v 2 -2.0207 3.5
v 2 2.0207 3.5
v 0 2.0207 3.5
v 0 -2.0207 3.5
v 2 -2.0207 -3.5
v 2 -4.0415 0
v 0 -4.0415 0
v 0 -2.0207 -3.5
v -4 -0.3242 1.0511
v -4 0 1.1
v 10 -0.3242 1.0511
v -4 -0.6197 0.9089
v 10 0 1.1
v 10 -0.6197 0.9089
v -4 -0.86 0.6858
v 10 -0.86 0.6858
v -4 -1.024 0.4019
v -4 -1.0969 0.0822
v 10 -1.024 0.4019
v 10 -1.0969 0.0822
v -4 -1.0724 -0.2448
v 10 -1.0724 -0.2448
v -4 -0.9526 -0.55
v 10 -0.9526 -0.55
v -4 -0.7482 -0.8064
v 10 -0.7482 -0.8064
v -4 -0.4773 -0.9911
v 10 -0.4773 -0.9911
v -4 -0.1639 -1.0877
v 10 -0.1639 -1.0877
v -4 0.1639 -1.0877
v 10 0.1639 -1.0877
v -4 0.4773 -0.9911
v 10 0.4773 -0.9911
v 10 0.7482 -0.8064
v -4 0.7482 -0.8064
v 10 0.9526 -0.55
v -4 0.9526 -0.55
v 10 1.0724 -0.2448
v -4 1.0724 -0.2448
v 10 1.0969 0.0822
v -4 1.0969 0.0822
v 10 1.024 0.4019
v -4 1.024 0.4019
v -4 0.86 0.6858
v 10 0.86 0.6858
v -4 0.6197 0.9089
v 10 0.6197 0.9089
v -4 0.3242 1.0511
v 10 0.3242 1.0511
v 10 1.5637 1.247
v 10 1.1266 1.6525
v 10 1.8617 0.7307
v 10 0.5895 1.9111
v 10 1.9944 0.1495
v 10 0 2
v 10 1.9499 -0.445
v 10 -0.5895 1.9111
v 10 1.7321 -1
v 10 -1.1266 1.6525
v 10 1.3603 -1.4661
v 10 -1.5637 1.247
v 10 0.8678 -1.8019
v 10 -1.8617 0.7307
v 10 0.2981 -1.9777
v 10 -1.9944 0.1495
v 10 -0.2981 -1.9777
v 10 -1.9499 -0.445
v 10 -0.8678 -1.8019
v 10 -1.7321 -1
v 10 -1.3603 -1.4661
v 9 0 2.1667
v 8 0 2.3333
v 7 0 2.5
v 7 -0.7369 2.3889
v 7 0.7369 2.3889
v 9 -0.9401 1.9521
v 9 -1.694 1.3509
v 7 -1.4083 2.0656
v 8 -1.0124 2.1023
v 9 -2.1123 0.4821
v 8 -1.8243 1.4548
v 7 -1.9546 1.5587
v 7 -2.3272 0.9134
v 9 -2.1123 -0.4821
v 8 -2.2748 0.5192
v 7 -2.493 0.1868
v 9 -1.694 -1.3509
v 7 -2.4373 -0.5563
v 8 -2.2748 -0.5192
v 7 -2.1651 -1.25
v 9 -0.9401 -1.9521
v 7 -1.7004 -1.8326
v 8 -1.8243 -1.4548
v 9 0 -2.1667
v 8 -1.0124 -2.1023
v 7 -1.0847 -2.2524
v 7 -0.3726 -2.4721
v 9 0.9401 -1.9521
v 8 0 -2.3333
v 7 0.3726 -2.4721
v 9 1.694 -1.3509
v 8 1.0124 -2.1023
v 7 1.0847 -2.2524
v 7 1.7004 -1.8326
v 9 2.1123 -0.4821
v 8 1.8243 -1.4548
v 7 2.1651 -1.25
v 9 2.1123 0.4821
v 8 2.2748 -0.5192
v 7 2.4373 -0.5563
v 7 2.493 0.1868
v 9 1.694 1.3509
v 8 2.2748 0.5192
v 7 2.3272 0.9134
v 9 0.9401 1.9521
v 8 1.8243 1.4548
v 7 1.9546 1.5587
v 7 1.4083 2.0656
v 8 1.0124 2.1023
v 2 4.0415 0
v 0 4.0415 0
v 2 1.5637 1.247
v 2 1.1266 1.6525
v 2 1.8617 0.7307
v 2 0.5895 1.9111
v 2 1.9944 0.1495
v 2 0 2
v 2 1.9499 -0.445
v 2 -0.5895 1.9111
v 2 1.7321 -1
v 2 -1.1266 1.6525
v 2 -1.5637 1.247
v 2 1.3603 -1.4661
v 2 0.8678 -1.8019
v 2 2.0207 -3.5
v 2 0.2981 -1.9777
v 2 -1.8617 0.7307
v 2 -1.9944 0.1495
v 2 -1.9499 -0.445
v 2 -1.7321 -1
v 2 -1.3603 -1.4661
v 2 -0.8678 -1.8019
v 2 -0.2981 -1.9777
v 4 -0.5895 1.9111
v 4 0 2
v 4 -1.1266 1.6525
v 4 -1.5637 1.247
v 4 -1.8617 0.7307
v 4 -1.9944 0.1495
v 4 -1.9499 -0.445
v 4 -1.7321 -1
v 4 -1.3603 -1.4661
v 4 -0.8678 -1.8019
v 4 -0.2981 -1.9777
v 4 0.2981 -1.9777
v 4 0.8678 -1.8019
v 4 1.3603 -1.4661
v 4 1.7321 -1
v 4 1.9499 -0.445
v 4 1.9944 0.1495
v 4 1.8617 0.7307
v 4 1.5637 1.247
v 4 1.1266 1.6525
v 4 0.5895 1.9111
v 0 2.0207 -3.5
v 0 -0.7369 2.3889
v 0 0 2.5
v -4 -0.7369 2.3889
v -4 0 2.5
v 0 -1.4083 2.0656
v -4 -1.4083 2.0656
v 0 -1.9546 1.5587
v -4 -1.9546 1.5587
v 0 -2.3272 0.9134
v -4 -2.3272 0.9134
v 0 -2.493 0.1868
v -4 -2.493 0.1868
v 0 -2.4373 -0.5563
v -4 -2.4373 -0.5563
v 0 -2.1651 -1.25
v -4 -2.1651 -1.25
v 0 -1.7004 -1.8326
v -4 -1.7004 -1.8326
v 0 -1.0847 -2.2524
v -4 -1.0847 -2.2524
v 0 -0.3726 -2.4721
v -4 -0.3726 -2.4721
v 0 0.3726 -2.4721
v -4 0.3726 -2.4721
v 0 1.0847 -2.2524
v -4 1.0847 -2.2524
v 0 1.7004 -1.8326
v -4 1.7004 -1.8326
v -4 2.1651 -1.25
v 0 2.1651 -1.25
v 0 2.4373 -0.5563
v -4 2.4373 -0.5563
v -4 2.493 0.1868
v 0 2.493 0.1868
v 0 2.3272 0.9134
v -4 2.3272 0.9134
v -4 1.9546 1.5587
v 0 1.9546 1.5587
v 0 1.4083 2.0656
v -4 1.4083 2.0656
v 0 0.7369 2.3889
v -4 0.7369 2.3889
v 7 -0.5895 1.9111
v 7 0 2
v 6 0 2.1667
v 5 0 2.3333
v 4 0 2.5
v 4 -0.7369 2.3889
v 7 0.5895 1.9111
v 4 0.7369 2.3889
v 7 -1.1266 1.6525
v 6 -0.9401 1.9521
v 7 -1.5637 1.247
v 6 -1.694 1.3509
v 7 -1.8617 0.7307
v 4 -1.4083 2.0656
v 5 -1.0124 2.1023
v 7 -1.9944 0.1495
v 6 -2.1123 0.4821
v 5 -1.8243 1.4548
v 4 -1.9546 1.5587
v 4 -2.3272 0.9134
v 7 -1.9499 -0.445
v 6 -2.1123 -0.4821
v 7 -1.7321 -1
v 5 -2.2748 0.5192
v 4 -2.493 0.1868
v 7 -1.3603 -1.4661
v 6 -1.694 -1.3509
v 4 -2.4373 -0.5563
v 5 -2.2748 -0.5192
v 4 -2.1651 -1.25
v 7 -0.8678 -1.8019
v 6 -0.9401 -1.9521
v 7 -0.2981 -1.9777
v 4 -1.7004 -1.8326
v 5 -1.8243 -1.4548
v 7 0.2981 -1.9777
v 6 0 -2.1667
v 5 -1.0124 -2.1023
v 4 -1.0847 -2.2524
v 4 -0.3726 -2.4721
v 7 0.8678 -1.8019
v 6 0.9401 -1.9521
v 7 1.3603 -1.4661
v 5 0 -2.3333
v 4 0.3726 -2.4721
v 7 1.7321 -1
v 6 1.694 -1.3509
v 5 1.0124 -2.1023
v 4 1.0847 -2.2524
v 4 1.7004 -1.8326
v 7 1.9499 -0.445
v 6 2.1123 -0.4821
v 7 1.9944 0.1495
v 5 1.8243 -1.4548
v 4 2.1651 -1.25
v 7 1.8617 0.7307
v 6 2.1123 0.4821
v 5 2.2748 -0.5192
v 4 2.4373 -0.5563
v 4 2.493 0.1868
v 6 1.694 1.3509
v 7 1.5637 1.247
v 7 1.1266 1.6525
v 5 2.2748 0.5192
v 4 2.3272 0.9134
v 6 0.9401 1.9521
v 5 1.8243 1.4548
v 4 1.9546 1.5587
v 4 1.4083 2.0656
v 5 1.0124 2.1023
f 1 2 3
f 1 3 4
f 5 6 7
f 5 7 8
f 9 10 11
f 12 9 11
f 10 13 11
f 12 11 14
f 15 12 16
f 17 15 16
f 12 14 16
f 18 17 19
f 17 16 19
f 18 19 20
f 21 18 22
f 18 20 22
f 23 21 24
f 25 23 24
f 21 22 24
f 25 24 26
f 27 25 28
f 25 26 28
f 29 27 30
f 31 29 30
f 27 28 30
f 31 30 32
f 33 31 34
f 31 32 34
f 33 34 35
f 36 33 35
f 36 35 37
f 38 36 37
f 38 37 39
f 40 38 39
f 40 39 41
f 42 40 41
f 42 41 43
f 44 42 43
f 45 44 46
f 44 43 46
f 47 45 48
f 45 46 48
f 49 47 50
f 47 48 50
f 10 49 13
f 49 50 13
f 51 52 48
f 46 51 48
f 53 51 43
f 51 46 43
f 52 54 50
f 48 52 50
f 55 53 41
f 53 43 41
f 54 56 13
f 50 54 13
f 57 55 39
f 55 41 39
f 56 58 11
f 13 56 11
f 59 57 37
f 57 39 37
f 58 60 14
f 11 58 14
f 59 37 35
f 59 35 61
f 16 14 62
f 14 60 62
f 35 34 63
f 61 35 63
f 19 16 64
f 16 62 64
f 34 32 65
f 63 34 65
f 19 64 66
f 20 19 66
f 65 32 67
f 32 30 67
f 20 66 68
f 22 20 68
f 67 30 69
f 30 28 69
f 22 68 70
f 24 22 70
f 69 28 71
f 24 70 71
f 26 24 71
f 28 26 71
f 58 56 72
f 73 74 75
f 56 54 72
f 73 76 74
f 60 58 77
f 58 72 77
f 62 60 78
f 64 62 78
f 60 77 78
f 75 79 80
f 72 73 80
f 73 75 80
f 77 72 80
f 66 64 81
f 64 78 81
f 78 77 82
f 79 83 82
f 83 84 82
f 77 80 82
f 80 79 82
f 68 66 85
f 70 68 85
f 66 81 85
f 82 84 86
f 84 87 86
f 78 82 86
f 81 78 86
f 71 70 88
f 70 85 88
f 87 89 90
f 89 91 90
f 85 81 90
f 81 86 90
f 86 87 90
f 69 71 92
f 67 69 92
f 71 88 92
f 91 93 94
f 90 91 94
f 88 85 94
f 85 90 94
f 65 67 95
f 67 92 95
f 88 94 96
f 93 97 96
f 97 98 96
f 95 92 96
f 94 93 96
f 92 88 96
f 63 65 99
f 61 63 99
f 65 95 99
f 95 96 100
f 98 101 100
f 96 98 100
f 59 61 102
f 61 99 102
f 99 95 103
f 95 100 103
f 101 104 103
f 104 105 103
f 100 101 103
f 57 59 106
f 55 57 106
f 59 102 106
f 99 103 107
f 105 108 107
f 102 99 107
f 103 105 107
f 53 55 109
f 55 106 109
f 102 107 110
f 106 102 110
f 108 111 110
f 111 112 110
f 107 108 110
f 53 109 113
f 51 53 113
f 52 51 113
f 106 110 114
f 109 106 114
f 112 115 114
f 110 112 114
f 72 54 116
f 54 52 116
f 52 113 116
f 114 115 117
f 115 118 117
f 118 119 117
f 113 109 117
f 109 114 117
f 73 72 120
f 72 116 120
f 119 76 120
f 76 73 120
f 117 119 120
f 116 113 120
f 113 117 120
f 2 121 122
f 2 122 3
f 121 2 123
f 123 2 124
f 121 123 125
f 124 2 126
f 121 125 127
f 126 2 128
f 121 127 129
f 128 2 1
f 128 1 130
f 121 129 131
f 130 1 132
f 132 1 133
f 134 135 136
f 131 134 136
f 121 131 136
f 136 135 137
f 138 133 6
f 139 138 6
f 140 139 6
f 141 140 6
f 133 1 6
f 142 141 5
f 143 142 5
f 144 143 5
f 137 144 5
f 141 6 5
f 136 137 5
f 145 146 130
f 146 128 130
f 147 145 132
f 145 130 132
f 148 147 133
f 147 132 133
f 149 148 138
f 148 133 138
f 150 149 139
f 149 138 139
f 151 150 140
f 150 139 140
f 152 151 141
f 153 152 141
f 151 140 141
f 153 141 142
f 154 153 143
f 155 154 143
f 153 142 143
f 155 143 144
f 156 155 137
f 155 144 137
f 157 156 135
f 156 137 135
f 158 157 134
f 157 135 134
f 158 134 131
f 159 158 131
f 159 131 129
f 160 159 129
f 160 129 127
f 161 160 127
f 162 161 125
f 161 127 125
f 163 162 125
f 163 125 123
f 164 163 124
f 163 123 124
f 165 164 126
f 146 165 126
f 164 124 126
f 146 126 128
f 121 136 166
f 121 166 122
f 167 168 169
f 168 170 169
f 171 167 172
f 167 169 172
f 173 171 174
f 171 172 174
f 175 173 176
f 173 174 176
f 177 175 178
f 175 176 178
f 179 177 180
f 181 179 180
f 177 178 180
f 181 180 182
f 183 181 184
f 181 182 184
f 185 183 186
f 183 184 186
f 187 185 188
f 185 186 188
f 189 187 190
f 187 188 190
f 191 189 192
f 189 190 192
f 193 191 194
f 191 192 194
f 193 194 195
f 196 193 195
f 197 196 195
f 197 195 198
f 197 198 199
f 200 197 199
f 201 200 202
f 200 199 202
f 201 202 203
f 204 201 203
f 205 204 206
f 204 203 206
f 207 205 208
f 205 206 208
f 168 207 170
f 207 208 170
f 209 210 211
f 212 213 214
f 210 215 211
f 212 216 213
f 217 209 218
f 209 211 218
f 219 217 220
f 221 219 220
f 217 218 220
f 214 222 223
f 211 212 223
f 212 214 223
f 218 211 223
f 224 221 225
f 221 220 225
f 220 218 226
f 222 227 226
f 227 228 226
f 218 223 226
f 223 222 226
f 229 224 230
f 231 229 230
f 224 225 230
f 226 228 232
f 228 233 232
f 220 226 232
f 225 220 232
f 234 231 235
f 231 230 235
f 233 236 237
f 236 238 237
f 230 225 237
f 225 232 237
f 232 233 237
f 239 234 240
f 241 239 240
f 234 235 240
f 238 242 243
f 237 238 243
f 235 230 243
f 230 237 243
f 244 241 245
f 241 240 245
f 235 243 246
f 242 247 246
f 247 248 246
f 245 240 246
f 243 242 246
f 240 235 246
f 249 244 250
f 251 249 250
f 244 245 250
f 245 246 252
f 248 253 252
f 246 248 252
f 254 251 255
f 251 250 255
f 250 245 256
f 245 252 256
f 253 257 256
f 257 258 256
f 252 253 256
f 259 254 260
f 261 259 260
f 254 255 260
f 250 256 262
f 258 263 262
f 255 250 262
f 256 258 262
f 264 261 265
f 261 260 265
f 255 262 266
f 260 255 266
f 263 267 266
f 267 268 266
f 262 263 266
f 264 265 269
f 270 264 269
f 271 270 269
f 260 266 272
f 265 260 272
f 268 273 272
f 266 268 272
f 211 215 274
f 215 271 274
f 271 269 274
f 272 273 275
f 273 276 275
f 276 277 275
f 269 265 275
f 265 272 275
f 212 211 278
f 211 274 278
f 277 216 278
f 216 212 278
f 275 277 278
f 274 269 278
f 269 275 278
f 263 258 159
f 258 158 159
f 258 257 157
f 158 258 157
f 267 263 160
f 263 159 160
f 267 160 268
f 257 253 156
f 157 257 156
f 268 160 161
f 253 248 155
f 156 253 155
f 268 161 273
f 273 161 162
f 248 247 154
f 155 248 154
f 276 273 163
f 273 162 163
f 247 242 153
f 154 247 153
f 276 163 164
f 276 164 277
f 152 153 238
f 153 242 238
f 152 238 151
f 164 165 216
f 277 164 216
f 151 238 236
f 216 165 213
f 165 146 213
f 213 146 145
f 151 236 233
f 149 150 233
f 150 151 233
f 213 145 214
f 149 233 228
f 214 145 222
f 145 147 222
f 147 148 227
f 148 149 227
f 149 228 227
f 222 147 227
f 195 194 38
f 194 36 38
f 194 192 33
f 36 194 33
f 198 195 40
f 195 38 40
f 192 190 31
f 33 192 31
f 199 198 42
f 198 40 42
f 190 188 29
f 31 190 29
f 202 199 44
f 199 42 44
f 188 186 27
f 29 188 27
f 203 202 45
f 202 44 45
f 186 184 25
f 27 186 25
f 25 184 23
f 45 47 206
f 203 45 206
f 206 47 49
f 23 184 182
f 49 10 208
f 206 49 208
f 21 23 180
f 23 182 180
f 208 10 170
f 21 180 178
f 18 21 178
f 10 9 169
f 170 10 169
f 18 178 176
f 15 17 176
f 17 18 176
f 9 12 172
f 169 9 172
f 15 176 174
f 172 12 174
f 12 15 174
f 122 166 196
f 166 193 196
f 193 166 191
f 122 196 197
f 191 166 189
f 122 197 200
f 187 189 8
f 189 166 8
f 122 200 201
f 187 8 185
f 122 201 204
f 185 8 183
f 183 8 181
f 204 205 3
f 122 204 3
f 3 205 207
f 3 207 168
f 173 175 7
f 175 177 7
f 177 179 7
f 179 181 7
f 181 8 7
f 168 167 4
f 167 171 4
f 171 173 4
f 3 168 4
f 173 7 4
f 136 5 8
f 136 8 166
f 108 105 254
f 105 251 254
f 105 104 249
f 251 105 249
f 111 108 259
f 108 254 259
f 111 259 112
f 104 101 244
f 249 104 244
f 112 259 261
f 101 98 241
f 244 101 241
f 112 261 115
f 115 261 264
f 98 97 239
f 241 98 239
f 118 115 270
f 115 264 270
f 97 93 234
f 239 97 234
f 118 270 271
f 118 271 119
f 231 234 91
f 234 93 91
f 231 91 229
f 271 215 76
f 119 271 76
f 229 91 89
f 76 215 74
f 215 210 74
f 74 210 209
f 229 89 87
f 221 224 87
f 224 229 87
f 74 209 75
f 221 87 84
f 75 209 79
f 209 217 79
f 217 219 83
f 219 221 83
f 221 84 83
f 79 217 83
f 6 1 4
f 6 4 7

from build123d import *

# Parameters (mm, degrees)
ESQUISSE5_OUTSIDE_W     = 15.98
ESQUISSE5_OUTSIDE_H     = 15.98
ENL_V_MAT_EXTRU_1_DEPTH = 2


with BuildPart() as part:
    # Esquisse4 → Révolution2 (revolve)
    with BuildSketch(Plane.XY, mode=Mode.PRIVATE) as r_volution2_sk:
        Polygon((10, 1.1), (10, 2), (7, 2.5), (7, 2), (4, 2.5), (4, 2), (2, 2), (2, 5), (0, 5), (0, 2.5), (-4, 2.5), (-4, 1.1), align=None)
    revolve(r_volution2_sk.sketch.rotate(Axis((0, 0, 0), (1, 0, 0)), 90), axis=Axis((0, 0, 0), (1, 0, 0)))

    # Esquisse5 outside → Enlèv. mat.-Extru.1 (cut)
    with BuildSketch(Plane(origin=(2, 0, 0), x_dir=(0, 0, -1), z_dir=(1, 0, 0))):
        Rectangle(ESQUISSE5_OUTSIDE_W, ESQUISSE5_OUTSIDE_H)
        Polygon((0, -4.041451884), (3.5, -2.020725942), (3.5, 2.020725942), (0, 4.041451884), (-3.5, 2.020725942), (-3.5, -2.020725942), align=None, mode=Mode.SUBTRACT)
    extrude(amount=-ENL_V_MAT_EXTRU_1_DEPTH, mode=Mode.SUBTRACT)


solid = part.part
